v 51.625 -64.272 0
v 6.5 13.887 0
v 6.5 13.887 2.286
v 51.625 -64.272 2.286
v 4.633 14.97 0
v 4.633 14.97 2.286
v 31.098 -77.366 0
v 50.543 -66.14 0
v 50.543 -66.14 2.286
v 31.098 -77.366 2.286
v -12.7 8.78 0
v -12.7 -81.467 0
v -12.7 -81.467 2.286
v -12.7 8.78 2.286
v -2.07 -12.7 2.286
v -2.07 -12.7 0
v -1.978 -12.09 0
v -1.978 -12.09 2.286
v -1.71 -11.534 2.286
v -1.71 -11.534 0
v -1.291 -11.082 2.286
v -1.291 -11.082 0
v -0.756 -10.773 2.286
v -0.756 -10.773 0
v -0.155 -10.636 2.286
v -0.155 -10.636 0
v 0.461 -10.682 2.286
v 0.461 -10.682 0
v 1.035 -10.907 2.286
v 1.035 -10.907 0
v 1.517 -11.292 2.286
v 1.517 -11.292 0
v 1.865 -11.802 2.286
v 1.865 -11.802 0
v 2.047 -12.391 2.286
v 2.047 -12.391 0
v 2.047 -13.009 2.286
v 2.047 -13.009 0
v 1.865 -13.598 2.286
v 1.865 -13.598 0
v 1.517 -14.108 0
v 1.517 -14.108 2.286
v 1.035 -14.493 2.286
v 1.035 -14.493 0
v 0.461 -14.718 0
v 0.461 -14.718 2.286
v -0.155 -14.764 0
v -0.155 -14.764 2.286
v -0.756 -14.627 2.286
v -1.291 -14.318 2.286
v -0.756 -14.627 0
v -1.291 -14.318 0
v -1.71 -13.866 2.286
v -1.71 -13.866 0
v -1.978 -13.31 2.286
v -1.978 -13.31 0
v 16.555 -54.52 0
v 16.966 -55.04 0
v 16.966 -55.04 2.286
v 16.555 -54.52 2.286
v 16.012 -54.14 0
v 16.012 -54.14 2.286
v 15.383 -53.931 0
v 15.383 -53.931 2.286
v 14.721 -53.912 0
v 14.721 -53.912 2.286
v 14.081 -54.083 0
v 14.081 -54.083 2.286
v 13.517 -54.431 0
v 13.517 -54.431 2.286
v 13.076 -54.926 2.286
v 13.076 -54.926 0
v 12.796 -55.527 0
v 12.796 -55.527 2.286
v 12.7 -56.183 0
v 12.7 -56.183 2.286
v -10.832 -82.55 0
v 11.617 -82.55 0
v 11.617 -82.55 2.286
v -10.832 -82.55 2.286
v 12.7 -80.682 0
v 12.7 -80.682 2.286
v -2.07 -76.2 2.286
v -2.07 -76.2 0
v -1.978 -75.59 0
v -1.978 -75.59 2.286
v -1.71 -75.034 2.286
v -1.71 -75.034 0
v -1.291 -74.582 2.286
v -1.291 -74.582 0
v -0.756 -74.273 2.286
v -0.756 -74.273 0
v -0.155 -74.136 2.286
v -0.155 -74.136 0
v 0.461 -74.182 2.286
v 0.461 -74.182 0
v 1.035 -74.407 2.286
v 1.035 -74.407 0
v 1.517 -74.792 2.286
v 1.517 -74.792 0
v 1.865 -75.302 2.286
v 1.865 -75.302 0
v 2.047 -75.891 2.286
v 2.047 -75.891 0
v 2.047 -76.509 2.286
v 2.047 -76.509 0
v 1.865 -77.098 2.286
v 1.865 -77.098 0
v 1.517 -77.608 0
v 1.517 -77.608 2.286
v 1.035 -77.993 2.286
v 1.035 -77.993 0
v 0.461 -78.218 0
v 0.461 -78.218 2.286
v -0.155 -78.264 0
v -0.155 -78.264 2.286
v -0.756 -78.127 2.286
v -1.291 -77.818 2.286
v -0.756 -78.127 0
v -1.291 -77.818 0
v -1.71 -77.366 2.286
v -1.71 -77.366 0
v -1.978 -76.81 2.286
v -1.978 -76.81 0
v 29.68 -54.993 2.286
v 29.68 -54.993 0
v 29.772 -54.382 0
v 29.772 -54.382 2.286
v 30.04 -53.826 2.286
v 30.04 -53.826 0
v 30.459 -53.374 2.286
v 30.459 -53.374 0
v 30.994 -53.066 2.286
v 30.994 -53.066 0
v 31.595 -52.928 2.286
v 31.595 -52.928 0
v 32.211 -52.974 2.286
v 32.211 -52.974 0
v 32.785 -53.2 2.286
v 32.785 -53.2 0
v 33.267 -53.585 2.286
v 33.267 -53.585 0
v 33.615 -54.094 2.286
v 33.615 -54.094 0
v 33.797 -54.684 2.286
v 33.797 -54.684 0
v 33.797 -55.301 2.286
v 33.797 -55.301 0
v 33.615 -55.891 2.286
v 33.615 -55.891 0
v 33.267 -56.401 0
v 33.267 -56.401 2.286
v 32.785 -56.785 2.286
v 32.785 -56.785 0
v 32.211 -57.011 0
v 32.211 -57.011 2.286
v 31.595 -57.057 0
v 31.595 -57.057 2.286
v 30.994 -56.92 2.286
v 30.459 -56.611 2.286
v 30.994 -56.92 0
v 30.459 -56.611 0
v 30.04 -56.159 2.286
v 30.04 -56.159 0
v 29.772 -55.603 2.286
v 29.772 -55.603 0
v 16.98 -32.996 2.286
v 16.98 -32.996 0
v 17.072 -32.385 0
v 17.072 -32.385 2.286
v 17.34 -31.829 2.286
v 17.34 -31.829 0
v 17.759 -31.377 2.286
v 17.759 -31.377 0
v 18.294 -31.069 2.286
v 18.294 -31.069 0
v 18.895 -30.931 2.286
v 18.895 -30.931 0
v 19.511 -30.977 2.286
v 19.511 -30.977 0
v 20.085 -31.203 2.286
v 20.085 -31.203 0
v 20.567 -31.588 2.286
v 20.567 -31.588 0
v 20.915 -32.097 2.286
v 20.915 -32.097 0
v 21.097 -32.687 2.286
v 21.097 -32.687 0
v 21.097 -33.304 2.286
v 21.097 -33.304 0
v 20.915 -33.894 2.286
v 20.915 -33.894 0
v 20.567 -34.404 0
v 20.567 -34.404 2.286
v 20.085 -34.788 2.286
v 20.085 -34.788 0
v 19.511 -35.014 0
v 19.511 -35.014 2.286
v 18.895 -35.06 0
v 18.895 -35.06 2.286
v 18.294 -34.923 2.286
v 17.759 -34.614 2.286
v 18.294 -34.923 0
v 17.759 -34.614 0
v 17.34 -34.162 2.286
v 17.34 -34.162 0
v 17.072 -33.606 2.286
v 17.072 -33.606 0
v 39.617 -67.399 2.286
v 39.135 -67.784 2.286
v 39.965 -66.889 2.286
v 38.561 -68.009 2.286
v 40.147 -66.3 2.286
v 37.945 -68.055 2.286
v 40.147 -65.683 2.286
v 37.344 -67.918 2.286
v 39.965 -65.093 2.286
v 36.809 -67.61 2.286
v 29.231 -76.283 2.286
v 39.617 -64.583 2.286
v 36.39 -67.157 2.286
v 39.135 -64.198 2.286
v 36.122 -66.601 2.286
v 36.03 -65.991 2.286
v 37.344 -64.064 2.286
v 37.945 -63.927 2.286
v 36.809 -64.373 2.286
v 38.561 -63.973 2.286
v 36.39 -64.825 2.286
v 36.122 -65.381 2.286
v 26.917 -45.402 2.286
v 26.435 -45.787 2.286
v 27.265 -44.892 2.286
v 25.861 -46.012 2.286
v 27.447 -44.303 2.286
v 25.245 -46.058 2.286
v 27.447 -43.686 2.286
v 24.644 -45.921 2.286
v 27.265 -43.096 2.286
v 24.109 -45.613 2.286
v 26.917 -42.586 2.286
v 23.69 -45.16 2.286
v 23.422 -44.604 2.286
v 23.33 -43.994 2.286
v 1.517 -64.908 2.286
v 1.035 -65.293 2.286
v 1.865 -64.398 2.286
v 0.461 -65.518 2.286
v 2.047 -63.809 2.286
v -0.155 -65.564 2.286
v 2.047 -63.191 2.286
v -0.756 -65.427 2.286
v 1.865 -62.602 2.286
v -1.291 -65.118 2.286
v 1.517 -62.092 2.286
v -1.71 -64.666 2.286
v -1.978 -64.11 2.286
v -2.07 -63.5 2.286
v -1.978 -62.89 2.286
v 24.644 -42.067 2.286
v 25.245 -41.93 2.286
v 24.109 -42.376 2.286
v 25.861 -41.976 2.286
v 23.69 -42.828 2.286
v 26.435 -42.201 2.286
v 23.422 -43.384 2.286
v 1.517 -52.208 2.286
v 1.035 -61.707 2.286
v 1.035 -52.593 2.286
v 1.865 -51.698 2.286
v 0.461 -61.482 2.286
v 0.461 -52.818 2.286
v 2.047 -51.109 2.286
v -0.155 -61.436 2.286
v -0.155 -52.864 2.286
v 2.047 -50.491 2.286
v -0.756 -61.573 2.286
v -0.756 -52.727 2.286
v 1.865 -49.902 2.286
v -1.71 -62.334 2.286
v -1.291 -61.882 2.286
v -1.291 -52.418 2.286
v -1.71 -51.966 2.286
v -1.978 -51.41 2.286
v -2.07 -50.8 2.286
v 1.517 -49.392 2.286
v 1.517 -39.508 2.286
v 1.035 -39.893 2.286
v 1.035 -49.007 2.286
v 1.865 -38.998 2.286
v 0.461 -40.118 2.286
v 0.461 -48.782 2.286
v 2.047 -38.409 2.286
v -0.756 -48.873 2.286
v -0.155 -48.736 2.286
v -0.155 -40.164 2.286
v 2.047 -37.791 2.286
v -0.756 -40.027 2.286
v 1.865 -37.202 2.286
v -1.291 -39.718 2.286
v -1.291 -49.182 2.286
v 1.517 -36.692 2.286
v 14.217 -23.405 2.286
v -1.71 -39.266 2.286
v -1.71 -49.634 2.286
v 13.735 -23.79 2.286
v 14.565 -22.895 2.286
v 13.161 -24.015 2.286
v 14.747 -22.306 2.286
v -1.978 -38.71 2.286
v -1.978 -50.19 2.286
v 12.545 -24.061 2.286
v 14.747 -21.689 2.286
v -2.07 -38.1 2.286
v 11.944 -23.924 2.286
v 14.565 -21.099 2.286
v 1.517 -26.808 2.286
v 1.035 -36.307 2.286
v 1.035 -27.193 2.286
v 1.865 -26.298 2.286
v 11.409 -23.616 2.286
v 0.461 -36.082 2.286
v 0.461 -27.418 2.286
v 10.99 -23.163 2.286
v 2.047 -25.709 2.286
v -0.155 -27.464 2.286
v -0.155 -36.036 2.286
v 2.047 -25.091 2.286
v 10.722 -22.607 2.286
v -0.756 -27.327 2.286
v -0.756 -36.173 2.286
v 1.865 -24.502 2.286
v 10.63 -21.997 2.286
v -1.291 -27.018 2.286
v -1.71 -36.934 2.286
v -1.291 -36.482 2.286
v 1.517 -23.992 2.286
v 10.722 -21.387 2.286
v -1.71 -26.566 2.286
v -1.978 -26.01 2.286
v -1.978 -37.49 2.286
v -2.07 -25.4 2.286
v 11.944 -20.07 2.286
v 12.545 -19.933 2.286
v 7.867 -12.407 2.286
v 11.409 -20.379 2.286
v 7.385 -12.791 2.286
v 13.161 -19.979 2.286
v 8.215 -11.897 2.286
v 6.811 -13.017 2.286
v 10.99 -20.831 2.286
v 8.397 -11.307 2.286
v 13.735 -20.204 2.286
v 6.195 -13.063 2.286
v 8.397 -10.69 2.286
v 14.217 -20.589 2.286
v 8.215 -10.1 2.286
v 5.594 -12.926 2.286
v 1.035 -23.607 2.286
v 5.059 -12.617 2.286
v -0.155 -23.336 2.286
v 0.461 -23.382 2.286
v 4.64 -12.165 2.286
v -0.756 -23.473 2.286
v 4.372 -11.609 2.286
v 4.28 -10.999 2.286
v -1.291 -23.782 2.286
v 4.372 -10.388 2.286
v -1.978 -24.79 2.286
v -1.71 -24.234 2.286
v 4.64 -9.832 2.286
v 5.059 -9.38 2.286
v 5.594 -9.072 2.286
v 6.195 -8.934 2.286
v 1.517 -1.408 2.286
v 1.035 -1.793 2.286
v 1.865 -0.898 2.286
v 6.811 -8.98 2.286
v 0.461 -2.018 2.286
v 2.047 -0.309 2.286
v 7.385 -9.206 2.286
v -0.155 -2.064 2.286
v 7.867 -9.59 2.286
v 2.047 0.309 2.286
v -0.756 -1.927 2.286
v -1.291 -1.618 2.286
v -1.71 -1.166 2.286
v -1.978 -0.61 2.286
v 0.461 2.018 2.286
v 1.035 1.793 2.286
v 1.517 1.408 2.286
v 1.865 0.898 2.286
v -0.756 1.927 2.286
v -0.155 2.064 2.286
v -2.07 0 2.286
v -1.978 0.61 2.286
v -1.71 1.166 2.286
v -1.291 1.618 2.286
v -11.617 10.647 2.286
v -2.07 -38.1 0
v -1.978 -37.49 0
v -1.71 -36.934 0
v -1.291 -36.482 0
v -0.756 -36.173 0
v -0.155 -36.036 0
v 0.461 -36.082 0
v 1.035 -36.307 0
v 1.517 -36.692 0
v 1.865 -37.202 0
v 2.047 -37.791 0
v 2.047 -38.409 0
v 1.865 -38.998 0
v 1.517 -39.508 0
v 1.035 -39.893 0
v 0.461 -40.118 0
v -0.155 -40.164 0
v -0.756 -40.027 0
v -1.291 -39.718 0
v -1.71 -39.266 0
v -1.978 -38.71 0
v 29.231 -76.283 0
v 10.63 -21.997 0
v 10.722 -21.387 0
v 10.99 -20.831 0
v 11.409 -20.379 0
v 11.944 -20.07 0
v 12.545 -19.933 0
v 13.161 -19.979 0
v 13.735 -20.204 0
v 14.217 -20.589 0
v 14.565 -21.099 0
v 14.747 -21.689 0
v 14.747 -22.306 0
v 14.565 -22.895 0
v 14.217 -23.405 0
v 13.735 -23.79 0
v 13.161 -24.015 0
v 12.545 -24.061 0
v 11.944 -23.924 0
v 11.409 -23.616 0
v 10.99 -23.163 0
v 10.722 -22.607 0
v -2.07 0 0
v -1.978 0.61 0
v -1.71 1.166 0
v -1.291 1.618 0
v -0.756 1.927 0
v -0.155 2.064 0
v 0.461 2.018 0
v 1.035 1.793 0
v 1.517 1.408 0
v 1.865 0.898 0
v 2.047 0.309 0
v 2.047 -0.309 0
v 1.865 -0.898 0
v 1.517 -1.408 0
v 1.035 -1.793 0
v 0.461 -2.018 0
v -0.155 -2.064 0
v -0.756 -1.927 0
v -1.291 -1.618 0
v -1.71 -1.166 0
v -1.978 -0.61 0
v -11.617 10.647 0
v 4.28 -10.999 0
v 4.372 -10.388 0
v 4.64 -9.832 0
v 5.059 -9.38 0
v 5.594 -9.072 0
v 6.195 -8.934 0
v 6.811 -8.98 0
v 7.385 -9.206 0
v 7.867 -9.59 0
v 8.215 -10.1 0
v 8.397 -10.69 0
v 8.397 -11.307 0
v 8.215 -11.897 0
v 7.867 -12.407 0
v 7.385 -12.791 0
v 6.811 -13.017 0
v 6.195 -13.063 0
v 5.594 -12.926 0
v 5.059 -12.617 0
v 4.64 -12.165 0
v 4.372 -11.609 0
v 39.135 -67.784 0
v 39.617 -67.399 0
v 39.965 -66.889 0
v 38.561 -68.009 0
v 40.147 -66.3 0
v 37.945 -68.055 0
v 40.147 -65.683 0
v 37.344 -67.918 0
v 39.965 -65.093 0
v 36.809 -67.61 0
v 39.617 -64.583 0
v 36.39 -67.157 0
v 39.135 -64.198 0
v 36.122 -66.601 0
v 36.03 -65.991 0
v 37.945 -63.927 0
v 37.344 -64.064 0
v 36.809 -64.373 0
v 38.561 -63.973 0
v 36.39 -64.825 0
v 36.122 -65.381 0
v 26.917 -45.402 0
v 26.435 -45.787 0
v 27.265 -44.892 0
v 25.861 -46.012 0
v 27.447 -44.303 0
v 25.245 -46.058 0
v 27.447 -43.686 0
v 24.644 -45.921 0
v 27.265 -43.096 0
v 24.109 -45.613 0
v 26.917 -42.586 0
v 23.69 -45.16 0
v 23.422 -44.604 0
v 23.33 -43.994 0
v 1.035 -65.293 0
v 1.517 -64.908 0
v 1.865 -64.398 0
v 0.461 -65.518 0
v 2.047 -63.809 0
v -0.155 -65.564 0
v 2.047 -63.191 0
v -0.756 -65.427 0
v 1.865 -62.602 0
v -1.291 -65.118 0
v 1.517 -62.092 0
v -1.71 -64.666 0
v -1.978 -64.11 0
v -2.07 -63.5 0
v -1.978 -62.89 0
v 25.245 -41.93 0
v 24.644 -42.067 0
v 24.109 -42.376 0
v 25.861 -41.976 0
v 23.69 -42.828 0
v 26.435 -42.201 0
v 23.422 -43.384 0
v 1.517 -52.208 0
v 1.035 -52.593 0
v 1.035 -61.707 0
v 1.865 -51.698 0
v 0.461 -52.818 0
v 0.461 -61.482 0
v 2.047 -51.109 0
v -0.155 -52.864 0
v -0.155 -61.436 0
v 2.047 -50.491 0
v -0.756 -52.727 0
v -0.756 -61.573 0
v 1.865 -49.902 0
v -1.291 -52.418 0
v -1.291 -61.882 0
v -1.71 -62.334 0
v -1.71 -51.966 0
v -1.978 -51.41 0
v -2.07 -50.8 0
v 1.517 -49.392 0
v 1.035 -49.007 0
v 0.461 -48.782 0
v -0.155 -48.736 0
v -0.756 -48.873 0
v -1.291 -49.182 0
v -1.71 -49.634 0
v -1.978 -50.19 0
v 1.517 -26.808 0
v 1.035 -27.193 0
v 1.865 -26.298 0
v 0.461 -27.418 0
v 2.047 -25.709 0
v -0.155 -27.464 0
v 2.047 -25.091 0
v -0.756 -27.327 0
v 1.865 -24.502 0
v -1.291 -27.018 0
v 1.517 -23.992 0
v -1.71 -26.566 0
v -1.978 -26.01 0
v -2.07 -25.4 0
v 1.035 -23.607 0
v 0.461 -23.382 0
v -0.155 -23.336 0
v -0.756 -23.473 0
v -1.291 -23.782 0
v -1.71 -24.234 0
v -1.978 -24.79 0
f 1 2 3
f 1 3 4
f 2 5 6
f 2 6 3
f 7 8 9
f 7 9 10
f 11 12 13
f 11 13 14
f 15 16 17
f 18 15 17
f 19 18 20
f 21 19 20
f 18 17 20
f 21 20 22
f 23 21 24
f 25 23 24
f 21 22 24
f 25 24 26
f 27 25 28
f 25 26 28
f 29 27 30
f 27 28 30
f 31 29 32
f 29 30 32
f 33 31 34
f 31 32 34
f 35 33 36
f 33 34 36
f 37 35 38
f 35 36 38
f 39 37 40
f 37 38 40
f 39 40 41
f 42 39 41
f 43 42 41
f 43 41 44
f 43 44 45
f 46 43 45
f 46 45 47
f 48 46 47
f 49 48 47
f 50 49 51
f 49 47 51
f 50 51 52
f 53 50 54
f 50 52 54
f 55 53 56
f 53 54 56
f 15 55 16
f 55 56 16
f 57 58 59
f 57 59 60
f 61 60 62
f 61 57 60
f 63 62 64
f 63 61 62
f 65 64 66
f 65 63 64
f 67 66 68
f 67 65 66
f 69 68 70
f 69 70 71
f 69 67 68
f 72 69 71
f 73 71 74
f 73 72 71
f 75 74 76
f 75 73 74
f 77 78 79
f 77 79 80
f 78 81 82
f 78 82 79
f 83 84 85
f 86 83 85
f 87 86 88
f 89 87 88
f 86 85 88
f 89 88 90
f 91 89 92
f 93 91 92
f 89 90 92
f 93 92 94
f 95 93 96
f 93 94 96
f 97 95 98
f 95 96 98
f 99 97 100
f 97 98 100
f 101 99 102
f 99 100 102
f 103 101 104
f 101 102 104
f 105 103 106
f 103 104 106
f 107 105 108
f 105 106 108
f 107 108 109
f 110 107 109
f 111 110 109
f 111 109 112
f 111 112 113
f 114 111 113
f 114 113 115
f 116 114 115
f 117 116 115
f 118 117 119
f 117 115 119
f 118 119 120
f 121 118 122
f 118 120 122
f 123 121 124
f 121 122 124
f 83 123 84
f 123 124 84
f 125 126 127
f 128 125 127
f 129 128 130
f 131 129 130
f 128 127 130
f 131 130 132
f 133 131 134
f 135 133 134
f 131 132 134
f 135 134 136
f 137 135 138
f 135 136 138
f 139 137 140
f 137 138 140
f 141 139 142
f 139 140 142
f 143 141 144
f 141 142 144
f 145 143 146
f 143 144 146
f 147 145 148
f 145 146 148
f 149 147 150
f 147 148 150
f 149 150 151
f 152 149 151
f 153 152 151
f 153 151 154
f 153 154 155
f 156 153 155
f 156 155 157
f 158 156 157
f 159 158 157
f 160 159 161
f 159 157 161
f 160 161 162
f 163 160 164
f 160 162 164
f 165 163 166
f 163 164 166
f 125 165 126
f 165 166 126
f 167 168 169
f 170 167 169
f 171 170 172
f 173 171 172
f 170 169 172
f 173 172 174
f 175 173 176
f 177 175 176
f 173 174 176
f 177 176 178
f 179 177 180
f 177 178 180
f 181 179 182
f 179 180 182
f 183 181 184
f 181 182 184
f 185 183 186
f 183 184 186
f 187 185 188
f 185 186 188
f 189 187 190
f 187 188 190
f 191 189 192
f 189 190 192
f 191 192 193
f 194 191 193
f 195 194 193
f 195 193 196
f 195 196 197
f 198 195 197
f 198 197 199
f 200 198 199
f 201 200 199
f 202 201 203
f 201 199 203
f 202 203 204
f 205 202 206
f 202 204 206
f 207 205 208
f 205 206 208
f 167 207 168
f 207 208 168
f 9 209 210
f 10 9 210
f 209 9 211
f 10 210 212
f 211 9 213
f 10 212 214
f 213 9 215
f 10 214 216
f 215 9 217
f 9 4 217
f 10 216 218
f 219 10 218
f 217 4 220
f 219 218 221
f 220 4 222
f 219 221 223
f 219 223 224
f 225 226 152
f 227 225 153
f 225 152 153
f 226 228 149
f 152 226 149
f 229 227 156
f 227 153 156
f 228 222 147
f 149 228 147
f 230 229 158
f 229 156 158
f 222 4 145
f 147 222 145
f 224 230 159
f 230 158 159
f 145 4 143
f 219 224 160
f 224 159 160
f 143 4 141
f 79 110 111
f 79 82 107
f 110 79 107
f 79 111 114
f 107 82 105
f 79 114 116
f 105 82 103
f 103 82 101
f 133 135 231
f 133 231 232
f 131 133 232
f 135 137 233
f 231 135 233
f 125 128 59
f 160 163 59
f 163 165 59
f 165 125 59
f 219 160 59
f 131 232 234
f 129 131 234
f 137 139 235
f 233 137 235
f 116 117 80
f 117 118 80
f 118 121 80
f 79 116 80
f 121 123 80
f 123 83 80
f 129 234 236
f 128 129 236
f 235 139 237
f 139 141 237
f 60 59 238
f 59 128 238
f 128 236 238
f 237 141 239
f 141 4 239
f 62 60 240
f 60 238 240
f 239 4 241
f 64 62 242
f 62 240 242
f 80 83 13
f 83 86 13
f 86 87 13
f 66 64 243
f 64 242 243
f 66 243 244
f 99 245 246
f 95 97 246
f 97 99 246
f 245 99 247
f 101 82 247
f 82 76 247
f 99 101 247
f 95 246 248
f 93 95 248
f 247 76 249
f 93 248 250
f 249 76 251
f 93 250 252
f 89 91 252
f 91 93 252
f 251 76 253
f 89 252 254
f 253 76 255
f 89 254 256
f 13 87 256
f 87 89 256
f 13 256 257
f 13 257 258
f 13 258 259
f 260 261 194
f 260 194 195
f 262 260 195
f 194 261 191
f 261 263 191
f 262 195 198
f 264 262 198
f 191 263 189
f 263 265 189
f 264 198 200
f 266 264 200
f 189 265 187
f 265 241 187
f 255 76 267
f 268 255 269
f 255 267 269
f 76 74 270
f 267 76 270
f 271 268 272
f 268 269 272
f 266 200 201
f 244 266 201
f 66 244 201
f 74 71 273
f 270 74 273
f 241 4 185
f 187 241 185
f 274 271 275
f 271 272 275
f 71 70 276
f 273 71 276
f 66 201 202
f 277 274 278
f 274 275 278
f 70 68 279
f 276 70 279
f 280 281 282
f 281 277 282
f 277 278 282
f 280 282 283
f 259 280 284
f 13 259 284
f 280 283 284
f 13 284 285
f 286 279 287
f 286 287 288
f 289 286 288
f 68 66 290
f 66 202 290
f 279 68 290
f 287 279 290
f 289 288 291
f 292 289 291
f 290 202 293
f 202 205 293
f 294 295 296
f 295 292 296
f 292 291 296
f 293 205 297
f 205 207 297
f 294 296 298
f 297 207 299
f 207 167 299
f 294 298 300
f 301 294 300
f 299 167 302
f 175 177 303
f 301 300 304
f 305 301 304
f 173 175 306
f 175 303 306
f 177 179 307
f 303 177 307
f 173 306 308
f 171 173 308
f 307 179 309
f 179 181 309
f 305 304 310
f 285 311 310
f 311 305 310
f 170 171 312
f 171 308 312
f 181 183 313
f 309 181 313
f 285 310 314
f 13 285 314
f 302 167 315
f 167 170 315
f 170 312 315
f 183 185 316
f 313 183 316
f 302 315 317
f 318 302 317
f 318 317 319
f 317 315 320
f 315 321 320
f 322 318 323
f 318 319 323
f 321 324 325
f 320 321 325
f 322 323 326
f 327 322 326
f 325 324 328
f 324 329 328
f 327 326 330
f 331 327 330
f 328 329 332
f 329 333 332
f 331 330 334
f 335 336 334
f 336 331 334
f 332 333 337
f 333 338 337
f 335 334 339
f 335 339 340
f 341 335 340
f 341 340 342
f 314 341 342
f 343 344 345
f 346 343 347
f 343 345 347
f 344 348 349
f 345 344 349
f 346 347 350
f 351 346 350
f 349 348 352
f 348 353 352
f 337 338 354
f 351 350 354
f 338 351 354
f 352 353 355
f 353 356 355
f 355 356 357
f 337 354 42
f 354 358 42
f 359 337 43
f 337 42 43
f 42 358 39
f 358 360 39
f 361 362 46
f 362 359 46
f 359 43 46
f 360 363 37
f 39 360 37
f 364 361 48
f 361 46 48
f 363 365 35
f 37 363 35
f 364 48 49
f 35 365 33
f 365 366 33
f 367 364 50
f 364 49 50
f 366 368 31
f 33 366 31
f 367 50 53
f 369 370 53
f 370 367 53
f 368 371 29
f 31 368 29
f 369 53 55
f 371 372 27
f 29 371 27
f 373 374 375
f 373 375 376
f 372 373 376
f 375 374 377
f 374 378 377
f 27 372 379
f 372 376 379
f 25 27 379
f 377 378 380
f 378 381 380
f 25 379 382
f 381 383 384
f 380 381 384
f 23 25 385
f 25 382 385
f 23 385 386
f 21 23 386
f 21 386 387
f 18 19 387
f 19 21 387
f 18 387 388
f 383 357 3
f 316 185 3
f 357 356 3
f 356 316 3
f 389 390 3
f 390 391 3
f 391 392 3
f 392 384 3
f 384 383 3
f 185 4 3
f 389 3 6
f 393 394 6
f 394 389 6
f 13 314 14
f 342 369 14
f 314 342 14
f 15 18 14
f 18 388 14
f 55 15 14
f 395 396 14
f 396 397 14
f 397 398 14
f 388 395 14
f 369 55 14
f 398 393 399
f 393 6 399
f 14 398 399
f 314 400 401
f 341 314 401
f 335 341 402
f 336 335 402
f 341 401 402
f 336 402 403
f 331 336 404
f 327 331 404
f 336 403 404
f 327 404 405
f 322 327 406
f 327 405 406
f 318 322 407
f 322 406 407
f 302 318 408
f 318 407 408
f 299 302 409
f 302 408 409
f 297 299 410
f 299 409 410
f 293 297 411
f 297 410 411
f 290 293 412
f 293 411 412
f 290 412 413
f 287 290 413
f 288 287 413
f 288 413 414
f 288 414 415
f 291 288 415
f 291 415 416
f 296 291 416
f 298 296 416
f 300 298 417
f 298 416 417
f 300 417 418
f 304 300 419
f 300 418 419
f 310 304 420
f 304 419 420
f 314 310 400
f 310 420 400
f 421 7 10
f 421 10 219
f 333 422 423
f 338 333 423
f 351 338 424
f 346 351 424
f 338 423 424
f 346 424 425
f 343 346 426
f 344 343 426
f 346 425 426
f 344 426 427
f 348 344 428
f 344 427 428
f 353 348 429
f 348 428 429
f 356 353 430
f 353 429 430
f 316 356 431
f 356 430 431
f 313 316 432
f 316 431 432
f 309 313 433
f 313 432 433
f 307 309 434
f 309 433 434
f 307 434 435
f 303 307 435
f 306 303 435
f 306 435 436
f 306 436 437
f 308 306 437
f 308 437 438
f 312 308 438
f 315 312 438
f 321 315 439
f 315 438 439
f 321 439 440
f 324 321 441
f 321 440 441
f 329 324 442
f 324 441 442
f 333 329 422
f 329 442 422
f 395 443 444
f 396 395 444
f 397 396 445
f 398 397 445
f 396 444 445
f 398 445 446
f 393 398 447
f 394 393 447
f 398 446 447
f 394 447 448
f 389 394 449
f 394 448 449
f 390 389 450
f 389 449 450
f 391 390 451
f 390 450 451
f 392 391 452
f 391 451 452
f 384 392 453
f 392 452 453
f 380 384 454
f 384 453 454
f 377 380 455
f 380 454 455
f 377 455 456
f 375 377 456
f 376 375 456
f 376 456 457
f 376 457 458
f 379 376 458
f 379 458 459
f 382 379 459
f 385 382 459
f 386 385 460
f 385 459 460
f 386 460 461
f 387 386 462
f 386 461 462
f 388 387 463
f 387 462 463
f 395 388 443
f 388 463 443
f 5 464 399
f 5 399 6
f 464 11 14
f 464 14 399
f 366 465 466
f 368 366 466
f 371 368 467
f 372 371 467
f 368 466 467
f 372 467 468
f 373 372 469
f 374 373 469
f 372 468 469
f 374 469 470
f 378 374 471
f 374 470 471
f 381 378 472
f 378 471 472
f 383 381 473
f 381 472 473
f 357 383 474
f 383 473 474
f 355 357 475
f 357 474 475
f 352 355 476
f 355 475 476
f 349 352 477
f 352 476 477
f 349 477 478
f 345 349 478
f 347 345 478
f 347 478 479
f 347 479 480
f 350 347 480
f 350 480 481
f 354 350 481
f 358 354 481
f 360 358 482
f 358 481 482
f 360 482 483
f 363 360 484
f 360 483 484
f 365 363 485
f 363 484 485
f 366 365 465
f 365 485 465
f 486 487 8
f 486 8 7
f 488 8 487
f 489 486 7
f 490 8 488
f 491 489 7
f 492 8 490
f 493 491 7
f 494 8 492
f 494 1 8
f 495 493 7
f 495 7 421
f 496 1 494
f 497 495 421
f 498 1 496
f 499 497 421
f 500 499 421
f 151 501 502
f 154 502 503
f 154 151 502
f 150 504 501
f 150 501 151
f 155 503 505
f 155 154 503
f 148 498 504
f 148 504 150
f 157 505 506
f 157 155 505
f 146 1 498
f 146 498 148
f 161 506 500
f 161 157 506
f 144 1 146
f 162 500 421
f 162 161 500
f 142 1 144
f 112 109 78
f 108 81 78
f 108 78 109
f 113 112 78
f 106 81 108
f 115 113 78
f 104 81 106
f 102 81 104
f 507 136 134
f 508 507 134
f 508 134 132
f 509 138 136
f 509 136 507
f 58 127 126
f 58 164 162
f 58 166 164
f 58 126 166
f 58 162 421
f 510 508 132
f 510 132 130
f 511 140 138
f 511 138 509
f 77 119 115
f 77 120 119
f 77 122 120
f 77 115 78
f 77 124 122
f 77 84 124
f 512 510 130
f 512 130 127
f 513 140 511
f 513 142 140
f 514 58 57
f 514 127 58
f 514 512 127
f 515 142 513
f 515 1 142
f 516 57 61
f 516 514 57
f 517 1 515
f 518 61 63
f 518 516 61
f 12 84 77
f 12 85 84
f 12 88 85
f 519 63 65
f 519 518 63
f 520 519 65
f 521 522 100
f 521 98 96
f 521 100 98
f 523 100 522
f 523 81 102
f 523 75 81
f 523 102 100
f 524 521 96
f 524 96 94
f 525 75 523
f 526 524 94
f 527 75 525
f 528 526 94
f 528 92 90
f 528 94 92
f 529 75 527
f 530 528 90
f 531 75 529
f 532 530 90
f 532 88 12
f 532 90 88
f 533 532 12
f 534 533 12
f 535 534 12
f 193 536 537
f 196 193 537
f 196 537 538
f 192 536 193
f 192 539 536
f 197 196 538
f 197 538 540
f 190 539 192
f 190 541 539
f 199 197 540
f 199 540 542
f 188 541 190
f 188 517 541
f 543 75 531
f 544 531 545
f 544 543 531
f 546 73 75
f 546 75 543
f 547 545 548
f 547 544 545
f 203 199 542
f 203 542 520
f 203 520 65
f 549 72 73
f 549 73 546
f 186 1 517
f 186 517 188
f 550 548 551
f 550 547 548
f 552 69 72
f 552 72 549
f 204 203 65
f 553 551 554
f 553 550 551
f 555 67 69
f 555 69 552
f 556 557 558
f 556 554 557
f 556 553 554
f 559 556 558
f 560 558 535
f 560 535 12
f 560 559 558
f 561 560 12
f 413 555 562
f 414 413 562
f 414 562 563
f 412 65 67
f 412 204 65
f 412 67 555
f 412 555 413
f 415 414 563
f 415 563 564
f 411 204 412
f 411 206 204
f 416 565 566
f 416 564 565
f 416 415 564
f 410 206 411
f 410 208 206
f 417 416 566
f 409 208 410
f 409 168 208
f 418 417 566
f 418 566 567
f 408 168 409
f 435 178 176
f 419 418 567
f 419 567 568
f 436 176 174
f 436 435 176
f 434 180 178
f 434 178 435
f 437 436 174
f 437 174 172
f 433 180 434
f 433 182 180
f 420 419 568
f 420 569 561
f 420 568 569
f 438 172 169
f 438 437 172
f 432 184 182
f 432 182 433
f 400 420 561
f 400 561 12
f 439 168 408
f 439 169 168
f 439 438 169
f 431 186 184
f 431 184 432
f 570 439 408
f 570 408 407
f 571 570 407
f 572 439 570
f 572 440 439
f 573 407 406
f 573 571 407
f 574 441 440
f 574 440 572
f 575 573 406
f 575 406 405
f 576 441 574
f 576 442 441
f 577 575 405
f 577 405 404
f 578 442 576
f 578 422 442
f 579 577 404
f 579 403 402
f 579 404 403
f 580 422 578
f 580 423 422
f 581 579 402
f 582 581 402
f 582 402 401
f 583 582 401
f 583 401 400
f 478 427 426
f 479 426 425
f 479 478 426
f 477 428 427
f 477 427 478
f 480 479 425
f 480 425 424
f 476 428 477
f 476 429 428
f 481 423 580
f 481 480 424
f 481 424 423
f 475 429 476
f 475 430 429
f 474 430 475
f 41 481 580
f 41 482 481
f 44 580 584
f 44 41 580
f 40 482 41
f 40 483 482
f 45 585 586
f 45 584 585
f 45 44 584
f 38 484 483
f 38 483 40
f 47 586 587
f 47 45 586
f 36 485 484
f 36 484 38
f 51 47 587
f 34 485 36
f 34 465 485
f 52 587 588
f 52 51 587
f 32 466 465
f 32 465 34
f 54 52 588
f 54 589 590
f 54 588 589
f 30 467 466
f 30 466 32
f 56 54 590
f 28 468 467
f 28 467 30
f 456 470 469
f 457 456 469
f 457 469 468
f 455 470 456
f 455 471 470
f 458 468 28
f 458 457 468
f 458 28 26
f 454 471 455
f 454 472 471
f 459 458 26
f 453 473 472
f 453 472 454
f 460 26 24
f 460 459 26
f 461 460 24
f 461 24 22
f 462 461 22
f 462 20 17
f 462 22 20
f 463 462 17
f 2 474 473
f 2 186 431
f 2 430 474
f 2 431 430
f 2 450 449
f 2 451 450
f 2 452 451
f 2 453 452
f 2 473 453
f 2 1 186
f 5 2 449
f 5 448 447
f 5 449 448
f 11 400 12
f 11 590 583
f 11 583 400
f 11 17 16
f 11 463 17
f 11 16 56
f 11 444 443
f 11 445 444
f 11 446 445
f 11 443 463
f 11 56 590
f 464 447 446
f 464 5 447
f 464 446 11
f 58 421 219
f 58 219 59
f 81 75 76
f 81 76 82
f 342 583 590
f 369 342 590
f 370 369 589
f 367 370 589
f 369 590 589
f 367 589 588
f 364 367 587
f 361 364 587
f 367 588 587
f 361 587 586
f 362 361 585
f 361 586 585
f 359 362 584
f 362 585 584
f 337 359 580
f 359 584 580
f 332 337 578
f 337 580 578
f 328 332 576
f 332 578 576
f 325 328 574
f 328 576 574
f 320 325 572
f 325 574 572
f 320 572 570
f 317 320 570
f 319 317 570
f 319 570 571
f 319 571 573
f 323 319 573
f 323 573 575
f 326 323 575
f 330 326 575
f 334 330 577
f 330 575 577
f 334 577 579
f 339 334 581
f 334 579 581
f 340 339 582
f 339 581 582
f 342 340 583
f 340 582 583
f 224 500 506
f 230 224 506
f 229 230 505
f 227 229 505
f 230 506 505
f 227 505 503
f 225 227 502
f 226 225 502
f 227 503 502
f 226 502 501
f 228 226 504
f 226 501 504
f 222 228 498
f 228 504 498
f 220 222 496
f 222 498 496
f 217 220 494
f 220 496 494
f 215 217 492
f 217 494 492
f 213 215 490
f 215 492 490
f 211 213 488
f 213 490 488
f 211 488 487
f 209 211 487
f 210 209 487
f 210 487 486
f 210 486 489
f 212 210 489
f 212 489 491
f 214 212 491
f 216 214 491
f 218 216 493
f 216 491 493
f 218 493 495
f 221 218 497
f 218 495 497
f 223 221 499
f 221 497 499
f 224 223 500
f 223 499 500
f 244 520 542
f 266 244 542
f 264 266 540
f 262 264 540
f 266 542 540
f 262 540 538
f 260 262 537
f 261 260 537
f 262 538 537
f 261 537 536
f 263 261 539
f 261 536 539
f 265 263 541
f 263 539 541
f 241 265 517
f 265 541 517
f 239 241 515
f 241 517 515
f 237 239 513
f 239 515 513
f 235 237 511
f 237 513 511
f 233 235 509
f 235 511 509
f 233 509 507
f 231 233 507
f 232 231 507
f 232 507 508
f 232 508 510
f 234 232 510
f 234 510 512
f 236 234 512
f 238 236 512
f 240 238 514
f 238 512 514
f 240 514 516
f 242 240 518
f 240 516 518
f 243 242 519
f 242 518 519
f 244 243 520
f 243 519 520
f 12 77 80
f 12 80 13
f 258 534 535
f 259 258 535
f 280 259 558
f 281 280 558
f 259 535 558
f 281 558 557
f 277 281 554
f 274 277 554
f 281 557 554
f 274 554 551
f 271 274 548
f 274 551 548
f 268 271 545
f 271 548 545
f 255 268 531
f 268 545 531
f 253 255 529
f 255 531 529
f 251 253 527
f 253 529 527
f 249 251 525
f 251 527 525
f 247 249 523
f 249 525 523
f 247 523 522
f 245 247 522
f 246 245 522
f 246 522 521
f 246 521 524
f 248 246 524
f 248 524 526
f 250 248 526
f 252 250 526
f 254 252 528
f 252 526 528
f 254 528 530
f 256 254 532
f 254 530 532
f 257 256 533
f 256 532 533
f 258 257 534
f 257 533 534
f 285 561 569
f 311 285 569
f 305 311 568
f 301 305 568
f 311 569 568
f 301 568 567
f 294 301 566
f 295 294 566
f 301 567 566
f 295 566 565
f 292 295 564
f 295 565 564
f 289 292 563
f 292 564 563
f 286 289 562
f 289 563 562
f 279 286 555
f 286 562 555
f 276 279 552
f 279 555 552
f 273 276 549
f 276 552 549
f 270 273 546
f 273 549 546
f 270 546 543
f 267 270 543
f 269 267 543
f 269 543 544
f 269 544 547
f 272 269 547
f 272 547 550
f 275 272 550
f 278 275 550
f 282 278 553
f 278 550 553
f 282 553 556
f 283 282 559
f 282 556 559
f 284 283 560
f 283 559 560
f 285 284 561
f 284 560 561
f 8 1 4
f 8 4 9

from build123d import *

# Parameters (mm, degrees)
SKETCH1_R           = 2.0701
BOSS_EXTRUDE1_DEPTH = 2.286


with BuildPart() as part:
    # Sketch1 → Boss-Extrude1 (new body)
    with BuildSketch(Plane(origin=(0, 0, 0), x_dir=(-1, 0, 0), z_dir=(0, 0, -1))):
        with BuildLine():
            Line((-29.230637652, -76.282949552), (-16.965734073, -55.039513402))
            ThreePointArc((-16.965734073, -55.039513402), (-14.394339663, -53.974406963), (-12.7, -56.182513402))
            Line((-12.7, -56.182513402), (-12.7, -80.682217477))
            Line((-12.7, -80.682217477), (-11.617101368, -82.55))
            Line((-11.617101368, -82.55), (10.832217477, -82.55))
            Line((10.832217477, -82.55), (12.7, -81.467101368))
            Line((12.7, -81.467101368), (12.7, 8.779535349))
            Line((12.7, 8.779535349), (11.617101368, 10.647317872))
            Line((11.617101368, 10.647317872), (-4.632676327, 14.969773631))
            Line((-4.632676327, 14.969773631), (-6.50045885, 13.886874999))
            Line((-6.50045885, 13.886874999), (-51.625488503, -64.271969053))
            Line((-51.625488503, -64.271969053), (-50.542589871, -66.139751576))
            Line((-50.542589871, -66.139751576), (-31.098420176, -77.365848184))
            Line((-31.098420176, -77.365848184), (-29.230637652, -76.282949552))
        make_face()
        with Locations((-38.1, -65.991135768)):
            Circle(SKETCH1_R, mode=Mode.SUBTRACT)
        with Locations((0, -63.5)):
            Circle(SKETCH1_R, mode=Mode.SUBTRACT)
        with Locations((-25.4, -43.994090512)):
            Circle(SKETCH1_R, mode=Mode.SUBTRACT)
        with Locations((-12.7, -21.997045256)):
            Circle(SKETCH1_R, mode=Mode.SUBTRACT)
        with Locations((0, -38.1)):
            Circle(SKETCH1_R, mode=Mode.SUBTRACT)
        with Locations((0, -12.7)):
            Circle(SKETCH1_R, mode=Mode.SUBTRACT)
        Circle(SKETCH1_R, mode=Mode.SUBTRACT)
        with Locations((-6.35, -10.998522628)):
            Circle(SKETCH1_R, mode=Mode.SUBTRACT)
        with Locations((0, -25.4)):
            Circle(SKETCH1_R, mode=Mode.SUBTRACT)
        with Locations((0, -50.8)):
            Circle(SKETCH1_R, mode=Mode.SUBTRACT)
        with Locations((-19.05, -32.995567884)):
            Circle(SKETCH1_R, mode=Mode.SUBTRACT)
        with Locations((-31.75, -54.99261314)):
            Circle(SKETCH1_R, mode=Mode.SUBTRACT)
        with Locations((0, -76.2)):
            Circle(SKETCH1_R, mode=Mode.SUBTRACT)
    extrude(amount=-BOSS_EXTRUDE1_DEPTH)


solid = part.part
